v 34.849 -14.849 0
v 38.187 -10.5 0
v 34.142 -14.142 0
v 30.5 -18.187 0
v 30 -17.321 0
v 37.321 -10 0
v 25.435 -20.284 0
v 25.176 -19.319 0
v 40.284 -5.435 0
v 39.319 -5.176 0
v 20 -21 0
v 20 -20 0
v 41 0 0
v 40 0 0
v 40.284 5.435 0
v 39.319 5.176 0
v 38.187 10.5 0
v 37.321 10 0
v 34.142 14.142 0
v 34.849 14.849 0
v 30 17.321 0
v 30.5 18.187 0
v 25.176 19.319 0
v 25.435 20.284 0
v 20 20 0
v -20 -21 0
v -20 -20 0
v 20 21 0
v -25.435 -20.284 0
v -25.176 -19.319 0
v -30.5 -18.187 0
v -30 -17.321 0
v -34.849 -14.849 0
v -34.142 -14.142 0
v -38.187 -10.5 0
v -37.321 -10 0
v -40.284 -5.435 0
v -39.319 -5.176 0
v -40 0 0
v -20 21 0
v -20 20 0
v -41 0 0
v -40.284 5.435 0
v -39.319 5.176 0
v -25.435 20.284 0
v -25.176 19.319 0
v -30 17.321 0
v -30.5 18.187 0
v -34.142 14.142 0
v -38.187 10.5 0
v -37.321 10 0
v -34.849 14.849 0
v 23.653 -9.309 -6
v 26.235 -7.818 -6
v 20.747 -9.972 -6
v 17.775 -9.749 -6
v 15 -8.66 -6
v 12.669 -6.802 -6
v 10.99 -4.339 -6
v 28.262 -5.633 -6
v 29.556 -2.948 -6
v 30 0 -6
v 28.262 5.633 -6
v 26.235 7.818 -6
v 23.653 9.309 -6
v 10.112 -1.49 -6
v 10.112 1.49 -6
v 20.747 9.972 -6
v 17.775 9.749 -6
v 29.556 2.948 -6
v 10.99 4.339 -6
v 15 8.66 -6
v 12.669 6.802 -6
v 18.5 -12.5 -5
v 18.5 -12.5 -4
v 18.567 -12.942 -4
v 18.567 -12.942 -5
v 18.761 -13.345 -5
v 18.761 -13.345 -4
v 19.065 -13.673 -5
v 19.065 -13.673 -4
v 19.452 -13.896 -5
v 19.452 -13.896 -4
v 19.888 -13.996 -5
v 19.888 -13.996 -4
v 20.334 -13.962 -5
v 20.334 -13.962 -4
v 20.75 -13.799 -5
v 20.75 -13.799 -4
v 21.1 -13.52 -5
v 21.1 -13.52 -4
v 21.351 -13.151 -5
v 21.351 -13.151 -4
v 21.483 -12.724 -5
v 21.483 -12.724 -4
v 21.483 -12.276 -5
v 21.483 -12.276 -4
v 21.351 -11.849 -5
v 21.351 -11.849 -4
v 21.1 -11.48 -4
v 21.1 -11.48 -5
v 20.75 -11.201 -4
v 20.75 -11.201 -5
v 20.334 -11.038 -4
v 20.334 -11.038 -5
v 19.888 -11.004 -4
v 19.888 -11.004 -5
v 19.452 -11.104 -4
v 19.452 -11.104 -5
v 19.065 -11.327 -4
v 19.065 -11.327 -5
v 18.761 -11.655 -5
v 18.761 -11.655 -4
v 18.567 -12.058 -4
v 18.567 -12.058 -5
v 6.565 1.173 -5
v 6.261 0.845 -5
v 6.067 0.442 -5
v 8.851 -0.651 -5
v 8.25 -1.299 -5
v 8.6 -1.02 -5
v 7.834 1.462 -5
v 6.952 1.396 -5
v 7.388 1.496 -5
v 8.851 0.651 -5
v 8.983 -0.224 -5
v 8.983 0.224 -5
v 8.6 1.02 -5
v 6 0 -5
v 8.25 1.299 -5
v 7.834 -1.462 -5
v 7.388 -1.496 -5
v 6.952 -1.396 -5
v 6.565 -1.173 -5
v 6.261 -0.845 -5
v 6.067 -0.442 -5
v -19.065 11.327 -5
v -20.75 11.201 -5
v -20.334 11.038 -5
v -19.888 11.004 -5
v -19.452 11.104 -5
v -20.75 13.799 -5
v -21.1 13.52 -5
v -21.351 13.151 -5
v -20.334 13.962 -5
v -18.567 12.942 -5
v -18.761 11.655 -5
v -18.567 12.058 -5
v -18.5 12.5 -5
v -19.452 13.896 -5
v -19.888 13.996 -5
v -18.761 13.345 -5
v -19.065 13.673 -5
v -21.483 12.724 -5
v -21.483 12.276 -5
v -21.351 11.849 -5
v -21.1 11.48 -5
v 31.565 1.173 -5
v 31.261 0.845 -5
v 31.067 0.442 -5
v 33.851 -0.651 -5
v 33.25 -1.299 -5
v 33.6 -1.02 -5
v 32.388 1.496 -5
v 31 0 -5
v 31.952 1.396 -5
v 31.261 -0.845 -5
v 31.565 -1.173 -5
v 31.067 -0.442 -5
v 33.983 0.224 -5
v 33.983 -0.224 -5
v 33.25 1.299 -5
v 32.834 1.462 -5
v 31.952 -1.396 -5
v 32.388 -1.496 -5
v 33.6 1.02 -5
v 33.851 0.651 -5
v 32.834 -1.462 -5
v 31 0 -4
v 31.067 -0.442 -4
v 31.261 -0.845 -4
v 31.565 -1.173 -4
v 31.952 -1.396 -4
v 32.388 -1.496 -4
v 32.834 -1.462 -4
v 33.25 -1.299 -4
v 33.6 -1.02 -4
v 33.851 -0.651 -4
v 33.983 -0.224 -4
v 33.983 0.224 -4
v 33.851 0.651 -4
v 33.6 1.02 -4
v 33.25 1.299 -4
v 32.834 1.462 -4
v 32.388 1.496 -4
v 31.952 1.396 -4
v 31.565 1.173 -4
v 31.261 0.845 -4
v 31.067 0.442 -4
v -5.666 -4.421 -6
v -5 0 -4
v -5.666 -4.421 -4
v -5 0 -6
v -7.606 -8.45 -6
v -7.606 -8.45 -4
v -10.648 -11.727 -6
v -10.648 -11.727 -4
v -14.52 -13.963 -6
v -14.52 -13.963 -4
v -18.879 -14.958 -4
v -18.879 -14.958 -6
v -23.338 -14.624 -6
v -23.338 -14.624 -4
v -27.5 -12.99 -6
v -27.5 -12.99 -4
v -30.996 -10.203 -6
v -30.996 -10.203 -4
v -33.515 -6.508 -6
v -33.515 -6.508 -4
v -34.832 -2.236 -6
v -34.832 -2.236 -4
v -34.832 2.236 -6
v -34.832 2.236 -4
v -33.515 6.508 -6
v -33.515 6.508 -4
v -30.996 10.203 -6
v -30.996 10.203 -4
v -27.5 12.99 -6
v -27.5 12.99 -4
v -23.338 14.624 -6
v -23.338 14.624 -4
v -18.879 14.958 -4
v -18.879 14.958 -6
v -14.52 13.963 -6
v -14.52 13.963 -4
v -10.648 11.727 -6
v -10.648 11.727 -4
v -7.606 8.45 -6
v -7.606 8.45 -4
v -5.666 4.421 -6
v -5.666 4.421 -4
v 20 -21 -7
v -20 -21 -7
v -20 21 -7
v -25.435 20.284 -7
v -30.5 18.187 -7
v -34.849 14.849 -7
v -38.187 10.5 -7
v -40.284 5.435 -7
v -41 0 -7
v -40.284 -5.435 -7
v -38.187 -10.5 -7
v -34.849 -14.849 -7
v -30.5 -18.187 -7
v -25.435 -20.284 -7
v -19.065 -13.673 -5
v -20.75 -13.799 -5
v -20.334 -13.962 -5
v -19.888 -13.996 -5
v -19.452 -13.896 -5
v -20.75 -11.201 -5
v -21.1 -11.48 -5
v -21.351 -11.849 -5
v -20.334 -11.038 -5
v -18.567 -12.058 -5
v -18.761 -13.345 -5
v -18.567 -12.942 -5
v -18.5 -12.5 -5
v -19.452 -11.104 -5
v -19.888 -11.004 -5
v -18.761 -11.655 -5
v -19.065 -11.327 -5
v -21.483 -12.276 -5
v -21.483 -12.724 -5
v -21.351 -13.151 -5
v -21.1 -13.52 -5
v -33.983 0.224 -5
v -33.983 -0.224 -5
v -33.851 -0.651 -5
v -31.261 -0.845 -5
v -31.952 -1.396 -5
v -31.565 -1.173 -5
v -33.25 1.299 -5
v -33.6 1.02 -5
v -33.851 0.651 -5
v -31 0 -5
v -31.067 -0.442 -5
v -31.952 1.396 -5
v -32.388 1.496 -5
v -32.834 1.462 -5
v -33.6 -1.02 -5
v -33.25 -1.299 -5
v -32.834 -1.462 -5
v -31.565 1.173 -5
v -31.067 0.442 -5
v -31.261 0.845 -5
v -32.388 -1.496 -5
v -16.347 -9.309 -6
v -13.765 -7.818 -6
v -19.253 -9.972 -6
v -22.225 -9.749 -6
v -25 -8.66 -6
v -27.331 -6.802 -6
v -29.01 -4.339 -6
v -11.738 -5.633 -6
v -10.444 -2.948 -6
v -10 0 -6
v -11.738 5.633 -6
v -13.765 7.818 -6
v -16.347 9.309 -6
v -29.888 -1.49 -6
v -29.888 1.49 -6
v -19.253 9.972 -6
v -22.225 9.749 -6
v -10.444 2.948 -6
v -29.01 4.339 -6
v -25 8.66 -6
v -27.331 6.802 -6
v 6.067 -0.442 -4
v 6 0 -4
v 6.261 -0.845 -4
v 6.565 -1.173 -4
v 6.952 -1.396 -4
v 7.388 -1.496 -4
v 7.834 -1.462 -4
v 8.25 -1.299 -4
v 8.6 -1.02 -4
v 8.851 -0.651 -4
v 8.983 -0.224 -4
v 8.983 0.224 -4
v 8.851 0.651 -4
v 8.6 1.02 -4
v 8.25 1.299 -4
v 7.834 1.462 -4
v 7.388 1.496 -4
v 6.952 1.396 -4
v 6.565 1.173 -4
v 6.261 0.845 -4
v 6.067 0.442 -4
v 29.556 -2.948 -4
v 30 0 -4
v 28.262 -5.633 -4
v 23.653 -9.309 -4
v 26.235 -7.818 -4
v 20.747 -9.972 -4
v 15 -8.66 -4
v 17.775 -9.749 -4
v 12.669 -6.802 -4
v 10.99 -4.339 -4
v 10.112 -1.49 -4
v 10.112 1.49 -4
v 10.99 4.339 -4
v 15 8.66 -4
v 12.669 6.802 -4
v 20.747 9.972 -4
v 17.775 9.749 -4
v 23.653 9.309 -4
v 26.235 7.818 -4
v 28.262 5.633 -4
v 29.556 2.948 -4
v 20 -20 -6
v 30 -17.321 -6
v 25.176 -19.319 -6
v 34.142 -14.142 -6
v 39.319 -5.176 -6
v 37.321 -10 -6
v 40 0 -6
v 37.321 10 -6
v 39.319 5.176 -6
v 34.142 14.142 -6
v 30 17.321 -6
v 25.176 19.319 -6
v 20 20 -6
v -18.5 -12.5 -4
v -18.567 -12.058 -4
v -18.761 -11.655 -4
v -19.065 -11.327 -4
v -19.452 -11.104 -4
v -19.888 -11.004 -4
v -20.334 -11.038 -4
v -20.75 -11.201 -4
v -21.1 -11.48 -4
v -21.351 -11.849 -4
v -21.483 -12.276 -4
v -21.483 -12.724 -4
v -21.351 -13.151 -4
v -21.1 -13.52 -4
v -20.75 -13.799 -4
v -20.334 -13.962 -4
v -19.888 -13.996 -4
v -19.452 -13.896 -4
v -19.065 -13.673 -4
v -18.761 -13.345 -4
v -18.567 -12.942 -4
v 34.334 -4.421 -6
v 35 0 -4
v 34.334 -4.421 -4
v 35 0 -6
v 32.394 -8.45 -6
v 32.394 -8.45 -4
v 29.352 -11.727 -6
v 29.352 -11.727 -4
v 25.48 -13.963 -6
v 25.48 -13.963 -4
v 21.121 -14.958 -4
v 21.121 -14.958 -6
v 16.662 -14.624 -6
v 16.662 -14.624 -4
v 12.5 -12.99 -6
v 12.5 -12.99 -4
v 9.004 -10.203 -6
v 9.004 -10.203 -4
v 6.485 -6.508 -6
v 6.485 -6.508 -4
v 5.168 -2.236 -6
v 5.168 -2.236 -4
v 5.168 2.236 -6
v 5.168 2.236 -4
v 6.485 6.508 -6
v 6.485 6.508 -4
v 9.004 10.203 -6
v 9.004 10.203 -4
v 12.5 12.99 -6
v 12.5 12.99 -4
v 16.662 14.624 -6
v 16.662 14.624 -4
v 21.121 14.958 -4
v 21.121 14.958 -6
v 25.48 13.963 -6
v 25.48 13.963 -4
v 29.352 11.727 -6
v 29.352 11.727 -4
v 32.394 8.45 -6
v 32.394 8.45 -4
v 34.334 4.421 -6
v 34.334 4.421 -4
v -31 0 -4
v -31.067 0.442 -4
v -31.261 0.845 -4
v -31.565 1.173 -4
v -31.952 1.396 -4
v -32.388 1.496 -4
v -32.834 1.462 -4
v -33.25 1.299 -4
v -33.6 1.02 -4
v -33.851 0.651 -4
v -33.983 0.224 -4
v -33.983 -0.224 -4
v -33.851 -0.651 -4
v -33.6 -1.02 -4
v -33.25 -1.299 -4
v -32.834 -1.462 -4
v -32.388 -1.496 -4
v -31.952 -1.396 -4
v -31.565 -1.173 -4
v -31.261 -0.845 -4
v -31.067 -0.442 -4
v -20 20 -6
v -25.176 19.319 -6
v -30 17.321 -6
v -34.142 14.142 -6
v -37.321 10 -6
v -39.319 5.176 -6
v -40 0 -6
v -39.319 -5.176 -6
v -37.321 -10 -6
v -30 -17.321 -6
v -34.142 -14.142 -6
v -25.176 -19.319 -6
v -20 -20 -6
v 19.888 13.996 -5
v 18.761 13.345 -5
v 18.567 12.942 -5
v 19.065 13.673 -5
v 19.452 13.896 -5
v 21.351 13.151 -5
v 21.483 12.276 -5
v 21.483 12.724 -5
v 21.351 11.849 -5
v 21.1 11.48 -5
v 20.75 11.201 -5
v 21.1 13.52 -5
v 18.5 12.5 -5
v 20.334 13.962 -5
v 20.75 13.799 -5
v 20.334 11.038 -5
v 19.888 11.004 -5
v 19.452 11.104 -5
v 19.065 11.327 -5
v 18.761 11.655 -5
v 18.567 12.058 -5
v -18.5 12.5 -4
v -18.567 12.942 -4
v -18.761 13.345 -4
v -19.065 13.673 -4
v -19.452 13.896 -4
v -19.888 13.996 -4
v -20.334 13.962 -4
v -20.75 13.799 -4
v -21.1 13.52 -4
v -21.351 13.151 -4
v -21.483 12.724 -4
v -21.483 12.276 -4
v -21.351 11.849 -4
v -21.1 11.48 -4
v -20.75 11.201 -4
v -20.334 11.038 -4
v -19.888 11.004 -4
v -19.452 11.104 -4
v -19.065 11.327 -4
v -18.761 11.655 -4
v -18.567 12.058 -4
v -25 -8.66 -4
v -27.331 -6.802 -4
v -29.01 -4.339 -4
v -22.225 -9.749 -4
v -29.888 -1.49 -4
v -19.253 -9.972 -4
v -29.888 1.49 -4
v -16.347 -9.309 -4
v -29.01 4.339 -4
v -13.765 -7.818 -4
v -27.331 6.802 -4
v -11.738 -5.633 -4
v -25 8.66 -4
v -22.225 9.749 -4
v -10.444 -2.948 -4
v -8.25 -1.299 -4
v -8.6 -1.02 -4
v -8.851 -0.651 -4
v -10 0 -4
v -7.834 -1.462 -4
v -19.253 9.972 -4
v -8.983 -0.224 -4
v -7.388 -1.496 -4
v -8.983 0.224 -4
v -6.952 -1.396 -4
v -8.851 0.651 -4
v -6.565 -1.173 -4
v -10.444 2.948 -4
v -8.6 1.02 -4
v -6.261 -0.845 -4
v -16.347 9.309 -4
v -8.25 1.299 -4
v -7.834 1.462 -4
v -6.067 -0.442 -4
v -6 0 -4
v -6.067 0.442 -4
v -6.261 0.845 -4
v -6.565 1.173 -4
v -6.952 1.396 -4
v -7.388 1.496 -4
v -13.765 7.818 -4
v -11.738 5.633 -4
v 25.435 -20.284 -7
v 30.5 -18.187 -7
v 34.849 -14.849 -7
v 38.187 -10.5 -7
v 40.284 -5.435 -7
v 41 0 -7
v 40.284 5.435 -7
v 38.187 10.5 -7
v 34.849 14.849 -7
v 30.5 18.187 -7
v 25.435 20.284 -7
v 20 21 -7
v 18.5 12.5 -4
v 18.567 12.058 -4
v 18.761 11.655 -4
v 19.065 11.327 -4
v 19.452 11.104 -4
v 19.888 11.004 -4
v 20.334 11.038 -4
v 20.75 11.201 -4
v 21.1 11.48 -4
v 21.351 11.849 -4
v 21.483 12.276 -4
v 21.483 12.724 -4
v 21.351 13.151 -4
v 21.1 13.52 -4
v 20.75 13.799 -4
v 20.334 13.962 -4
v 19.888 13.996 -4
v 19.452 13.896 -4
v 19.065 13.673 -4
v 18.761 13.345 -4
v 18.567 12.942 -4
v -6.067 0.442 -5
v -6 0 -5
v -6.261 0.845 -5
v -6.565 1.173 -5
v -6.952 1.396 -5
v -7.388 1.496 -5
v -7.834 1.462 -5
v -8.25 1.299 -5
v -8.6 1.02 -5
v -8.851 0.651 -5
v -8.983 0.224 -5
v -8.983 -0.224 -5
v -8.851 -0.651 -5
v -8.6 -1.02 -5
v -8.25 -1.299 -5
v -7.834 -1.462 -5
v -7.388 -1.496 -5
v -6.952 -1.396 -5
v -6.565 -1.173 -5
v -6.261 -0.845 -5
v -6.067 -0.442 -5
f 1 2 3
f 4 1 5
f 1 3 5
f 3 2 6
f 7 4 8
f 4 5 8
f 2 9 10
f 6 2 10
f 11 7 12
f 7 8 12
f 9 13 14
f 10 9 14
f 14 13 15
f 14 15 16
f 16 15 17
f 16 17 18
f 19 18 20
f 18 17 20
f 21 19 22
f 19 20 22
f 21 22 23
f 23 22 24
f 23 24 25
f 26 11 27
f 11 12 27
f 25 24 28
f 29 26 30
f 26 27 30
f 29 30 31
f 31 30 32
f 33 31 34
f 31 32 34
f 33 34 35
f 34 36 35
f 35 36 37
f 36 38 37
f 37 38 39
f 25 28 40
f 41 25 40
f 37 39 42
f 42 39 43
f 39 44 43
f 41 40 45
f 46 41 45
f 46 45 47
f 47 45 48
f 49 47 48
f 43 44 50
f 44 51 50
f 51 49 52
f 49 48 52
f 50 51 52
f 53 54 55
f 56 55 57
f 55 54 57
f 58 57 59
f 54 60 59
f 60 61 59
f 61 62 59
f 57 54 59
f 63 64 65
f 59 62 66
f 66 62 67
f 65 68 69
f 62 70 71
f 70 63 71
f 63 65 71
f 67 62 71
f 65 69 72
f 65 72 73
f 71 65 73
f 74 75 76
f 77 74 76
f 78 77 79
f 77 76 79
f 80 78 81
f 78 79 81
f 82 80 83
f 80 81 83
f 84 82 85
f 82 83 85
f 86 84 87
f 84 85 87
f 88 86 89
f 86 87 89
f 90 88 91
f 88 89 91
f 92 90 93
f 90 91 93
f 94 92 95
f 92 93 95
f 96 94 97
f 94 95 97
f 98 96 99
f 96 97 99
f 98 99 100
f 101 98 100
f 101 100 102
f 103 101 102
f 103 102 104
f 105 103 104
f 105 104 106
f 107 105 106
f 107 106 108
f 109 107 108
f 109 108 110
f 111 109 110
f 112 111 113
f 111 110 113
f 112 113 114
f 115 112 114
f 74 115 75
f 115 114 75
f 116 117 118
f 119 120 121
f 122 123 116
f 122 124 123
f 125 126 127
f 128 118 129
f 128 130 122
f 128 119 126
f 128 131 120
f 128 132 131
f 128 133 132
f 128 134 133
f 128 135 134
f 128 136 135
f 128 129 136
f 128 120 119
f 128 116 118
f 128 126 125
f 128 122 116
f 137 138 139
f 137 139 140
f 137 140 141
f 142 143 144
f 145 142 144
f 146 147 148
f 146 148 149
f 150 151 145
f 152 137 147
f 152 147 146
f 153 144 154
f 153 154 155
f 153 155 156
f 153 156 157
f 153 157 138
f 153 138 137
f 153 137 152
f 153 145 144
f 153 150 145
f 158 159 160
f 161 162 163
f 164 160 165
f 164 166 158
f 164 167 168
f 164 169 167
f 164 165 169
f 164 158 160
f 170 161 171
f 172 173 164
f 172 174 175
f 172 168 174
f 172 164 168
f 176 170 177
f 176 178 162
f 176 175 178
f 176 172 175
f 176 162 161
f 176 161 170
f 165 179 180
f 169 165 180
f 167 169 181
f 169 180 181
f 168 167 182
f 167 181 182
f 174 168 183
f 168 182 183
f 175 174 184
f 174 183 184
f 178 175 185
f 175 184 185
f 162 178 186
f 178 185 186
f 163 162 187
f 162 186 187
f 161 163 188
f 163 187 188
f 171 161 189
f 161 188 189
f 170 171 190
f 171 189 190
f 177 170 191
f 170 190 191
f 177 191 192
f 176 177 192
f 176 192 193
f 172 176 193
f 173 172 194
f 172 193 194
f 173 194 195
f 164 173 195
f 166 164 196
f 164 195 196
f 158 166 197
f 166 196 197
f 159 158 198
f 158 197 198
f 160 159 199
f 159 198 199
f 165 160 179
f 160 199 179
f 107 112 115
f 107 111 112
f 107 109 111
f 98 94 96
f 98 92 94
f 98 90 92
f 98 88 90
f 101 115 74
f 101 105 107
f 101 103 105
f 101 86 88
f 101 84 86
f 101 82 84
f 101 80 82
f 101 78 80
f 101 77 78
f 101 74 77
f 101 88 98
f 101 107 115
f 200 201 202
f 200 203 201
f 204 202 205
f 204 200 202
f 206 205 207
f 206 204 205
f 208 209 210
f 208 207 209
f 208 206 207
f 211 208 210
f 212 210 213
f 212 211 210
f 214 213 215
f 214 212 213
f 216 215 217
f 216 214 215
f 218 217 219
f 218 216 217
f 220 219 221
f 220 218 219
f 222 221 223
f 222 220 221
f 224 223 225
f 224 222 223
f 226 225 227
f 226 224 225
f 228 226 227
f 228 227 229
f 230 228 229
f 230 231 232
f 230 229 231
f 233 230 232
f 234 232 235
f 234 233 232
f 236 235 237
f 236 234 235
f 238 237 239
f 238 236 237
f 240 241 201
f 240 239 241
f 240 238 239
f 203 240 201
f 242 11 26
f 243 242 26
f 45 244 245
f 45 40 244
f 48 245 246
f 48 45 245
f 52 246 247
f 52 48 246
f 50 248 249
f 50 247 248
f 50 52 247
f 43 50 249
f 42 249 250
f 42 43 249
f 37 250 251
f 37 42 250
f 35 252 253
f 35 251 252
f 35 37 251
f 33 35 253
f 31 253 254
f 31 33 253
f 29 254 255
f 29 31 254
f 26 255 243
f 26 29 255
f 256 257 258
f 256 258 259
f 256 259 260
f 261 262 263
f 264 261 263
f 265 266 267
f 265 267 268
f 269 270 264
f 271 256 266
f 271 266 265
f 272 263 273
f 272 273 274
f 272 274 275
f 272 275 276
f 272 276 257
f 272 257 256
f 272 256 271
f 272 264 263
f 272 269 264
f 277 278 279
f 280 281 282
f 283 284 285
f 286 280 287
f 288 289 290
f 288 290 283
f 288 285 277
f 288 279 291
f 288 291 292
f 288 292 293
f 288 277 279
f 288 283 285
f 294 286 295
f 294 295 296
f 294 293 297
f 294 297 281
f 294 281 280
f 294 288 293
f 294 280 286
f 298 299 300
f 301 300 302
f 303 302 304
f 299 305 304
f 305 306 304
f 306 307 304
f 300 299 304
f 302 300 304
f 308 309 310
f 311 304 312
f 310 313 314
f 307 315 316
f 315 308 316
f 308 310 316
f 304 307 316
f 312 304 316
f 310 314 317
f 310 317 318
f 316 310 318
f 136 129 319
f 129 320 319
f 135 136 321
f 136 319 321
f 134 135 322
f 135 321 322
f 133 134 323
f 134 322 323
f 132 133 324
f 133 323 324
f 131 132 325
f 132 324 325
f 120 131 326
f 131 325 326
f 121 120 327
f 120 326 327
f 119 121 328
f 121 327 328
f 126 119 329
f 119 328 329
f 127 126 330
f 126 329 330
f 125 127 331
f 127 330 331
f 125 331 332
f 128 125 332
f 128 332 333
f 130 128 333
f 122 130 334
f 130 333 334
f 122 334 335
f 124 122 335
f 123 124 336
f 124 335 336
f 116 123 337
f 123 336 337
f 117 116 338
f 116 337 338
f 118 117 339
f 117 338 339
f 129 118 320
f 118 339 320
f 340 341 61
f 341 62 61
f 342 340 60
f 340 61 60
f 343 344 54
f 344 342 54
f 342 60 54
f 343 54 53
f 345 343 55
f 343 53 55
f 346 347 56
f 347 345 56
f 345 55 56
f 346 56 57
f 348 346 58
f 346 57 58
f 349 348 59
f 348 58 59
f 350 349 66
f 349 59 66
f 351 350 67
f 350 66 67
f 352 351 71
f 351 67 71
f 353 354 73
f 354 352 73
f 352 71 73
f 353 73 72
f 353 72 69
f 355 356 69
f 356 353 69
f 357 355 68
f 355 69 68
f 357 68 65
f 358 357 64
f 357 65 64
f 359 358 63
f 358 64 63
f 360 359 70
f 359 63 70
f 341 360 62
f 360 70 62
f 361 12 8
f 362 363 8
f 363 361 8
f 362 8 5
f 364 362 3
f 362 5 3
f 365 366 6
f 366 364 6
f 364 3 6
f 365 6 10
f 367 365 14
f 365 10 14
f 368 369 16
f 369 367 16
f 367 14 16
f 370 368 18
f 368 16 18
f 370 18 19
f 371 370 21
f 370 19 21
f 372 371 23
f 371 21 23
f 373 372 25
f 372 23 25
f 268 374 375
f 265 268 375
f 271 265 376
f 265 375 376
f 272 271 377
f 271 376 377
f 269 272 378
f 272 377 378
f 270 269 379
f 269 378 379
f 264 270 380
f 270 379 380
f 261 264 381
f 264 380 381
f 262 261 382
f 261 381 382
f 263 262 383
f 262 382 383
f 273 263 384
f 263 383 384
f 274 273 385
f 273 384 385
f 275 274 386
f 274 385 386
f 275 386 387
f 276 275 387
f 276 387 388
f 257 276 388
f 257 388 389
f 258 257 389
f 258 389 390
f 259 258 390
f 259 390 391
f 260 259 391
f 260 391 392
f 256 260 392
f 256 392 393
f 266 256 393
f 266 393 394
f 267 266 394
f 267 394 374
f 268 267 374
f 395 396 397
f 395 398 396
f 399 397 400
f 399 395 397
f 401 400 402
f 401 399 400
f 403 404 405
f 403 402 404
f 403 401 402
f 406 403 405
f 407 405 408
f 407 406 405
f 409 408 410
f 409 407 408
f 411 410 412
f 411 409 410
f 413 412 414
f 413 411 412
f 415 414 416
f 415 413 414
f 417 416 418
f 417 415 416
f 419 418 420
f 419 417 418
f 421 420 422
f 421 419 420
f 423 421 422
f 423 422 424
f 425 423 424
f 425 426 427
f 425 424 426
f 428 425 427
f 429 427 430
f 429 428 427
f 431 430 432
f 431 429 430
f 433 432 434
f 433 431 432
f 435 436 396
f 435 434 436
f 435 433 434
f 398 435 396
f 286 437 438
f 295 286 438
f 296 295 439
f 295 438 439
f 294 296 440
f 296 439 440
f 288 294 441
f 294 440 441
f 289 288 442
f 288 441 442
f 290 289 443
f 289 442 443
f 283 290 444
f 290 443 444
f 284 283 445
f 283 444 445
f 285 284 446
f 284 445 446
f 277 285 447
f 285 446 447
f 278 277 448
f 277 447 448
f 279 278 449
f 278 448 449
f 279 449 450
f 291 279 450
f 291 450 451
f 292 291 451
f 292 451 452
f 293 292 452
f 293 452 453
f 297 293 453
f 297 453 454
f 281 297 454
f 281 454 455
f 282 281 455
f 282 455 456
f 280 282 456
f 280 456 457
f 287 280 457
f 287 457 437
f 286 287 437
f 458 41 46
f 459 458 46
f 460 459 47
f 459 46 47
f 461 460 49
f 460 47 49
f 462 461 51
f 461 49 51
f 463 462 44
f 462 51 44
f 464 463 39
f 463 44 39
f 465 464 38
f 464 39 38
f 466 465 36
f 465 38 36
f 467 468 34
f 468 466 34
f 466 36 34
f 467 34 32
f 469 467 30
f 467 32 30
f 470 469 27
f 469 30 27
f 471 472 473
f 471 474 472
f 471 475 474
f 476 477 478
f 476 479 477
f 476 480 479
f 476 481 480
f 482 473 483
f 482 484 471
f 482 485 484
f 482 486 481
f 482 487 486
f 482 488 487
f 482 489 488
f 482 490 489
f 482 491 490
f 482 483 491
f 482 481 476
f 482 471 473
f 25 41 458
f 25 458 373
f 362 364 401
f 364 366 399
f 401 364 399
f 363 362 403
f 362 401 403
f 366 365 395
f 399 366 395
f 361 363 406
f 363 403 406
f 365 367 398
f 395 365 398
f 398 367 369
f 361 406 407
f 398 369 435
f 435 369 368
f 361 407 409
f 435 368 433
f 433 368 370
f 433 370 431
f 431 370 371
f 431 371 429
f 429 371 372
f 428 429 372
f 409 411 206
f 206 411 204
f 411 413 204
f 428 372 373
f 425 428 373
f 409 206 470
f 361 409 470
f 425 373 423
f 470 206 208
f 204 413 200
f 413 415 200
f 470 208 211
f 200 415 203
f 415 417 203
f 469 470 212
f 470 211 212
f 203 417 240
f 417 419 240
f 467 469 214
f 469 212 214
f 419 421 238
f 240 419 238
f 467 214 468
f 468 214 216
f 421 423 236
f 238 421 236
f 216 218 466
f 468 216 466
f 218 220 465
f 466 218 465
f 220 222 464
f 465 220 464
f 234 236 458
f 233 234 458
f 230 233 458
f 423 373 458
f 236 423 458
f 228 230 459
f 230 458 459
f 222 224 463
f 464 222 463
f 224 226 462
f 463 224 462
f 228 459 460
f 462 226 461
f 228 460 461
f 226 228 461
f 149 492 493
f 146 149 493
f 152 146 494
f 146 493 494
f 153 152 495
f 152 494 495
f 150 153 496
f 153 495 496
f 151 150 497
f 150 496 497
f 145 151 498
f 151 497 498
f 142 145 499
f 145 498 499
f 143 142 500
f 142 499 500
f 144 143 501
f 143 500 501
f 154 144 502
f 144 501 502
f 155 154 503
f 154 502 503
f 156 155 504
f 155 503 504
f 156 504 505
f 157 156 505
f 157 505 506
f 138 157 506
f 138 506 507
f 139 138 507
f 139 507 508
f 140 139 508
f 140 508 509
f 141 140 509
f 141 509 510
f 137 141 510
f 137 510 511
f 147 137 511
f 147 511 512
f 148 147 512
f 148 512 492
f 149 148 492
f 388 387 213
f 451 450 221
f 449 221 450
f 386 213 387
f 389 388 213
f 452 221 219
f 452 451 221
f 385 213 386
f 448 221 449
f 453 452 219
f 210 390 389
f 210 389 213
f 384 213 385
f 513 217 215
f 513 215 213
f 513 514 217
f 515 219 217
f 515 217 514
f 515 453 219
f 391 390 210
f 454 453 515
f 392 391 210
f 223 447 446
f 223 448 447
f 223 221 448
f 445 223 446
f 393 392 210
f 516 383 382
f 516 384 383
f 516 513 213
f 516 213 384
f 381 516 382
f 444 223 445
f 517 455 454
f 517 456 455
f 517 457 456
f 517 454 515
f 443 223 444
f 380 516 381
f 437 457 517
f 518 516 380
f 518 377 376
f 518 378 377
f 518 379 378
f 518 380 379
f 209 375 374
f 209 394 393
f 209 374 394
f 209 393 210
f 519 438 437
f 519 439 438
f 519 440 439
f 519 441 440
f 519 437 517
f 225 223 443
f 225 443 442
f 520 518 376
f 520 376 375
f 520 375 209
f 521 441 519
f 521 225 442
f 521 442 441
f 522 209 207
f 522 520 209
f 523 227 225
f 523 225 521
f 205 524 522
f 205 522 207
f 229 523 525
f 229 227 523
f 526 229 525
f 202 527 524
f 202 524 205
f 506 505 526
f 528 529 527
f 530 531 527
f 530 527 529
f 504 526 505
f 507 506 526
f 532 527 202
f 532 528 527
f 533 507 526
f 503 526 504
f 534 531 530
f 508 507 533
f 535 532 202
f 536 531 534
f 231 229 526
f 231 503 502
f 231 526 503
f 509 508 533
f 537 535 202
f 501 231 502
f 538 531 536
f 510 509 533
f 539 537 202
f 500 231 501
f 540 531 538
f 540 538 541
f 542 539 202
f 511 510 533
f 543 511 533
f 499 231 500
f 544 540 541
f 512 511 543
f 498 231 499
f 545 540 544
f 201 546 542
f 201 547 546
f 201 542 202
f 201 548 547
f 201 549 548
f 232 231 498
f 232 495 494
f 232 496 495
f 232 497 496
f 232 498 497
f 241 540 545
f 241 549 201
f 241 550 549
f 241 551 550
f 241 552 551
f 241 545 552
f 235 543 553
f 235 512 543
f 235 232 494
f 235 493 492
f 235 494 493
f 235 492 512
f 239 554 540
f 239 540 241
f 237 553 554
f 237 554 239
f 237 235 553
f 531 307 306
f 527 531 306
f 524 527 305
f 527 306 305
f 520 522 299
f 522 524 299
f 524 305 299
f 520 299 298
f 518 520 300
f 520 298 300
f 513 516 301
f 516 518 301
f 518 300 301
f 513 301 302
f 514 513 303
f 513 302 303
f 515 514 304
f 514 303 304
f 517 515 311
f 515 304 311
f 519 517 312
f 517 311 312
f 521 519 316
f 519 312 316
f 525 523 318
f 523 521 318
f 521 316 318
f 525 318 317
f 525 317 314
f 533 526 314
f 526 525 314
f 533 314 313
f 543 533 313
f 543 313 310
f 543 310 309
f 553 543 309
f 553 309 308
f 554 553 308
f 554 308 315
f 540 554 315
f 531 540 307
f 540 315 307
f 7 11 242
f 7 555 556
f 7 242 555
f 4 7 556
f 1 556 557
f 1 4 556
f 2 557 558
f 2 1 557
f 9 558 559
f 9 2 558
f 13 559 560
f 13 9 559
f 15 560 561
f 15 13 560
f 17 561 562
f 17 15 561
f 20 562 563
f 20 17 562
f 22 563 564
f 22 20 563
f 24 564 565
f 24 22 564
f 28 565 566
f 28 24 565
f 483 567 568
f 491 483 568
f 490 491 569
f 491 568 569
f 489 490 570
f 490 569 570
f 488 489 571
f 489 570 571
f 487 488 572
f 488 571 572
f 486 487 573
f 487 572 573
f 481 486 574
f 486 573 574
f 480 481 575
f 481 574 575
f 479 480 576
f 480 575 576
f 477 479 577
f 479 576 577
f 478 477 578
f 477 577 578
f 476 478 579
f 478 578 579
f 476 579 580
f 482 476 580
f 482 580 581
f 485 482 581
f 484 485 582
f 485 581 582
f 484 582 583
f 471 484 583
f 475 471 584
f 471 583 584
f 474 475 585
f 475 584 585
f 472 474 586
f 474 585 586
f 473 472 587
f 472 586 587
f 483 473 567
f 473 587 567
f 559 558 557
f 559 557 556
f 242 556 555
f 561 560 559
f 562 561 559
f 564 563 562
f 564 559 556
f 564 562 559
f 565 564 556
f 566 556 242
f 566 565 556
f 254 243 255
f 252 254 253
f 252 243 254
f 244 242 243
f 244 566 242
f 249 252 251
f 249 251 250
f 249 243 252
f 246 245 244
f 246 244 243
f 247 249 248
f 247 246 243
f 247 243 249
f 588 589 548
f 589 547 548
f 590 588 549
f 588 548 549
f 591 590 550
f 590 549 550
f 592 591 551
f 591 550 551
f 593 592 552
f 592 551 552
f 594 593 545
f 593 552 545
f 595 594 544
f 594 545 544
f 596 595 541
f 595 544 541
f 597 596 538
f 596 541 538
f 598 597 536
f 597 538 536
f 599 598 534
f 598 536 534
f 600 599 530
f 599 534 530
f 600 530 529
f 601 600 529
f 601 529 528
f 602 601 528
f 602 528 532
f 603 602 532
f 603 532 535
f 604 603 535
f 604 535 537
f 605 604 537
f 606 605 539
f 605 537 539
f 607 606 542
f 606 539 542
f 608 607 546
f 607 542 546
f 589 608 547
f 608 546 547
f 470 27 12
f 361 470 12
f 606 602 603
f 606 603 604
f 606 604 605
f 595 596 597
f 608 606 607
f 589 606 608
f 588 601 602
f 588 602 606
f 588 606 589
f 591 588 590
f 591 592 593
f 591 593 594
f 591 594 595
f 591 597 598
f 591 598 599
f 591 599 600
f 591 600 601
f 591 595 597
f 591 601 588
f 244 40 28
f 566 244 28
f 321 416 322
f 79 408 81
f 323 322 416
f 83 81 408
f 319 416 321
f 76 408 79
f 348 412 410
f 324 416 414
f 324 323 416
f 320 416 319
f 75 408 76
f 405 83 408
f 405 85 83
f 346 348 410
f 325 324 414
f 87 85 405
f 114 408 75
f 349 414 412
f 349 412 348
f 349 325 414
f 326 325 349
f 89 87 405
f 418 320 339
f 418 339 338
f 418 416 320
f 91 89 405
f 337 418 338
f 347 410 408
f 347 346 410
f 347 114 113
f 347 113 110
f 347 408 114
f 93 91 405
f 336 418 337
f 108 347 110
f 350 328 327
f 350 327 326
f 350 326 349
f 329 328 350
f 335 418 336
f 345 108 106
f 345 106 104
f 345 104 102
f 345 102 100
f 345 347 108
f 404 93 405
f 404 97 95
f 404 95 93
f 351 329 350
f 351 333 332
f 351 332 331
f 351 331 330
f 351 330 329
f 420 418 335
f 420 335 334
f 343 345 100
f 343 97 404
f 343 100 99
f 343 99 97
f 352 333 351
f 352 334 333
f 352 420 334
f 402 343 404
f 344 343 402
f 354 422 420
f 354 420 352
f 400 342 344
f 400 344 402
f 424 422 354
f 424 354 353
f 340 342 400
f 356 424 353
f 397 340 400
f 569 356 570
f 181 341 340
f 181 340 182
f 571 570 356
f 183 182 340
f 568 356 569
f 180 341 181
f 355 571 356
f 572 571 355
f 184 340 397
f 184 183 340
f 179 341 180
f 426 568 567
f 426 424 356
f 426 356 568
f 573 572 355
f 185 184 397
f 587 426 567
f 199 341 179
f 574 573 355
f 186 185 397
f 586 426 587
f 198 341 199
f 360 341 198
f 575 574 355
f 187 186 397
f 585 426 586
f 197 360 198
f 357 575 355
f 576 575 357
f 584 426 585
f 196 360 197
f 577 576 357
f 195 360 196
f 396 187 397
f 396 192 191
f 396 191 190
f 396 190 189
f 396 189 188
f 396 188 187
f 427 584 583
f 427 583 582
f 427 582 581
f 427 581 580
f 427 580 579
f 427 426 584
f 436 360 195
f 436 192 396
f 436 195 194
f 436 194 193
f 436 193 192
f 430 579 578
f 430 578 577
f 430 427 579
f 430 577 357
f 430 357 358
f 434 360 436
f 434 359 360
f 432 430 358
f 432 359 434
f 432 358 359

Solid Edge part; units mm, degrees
sketch "Sketch1" plane through (0, 0, 0) normal (0, 0, 1) x (1, 0, 0)
  line L0 (20, -21) -> (-20, -21)
  line L1 (-20, 21) -> (20, 21)
  arc A0 (20, 21) -> (20, -21) centre (20, 0) cw
  arc A1 (-20, -21) -> (-20, 21) centre (-20, 0) cw
extrude "Protrusion1" add sketch "Sketch1" against normal blind 7
sketch "Sketch2" plane through (0, 0, 0) normal (0, 0, 1) x (1, 0, 0)
  arc A0 (-20, -20) -> (-20, 20) centre (-20, 0) cw
  line L0 (-20, -20) -> (20, -20)
  arc A1 (20, 20) -> (20, -20) centre (20, 0) cw
  line L1 (-20, 20) -> (20, 20)
extrude "VaciadoExtruido_1" cut sketch "Sketch2" against normal blind 6
sketch "Sketch3" plane through (0, 0, -6) normal (0, 0, 1) x (1, 0, 0)
  circle A0 centre (-20, 0) radius 10
  circle A1 centre (-20, 0) radius 15
  circle A2 centre (20, 0) radius 15
  circle A3 centre (20, 0) radius 10
  dimension "D1" = 40
  dimension "D2" = 20
extrude "Protrusion2" add sketch "Sketch3" along normal blind 2
sketch "Sketch4" plane through (-20, 0, -4) normal (0, 0, 1) x (1, 0, 0)
  circle A0 centre (0, 12.5) radius 1.5
  circle A1 centre (-12.5, 0) radius 1.5
  circle A2 centre (0, -12.5) radius 1.5
  circle A3 centre (12.5, 0) radius 1.5
extrude "VaciadoExtruido_2" cut sketch "Sketch4" against normal blind 1
mirror "Mirror1" about plane through (0, 0, 0) normal (1, 0, 0) of "VaciadoExtruido_2"
